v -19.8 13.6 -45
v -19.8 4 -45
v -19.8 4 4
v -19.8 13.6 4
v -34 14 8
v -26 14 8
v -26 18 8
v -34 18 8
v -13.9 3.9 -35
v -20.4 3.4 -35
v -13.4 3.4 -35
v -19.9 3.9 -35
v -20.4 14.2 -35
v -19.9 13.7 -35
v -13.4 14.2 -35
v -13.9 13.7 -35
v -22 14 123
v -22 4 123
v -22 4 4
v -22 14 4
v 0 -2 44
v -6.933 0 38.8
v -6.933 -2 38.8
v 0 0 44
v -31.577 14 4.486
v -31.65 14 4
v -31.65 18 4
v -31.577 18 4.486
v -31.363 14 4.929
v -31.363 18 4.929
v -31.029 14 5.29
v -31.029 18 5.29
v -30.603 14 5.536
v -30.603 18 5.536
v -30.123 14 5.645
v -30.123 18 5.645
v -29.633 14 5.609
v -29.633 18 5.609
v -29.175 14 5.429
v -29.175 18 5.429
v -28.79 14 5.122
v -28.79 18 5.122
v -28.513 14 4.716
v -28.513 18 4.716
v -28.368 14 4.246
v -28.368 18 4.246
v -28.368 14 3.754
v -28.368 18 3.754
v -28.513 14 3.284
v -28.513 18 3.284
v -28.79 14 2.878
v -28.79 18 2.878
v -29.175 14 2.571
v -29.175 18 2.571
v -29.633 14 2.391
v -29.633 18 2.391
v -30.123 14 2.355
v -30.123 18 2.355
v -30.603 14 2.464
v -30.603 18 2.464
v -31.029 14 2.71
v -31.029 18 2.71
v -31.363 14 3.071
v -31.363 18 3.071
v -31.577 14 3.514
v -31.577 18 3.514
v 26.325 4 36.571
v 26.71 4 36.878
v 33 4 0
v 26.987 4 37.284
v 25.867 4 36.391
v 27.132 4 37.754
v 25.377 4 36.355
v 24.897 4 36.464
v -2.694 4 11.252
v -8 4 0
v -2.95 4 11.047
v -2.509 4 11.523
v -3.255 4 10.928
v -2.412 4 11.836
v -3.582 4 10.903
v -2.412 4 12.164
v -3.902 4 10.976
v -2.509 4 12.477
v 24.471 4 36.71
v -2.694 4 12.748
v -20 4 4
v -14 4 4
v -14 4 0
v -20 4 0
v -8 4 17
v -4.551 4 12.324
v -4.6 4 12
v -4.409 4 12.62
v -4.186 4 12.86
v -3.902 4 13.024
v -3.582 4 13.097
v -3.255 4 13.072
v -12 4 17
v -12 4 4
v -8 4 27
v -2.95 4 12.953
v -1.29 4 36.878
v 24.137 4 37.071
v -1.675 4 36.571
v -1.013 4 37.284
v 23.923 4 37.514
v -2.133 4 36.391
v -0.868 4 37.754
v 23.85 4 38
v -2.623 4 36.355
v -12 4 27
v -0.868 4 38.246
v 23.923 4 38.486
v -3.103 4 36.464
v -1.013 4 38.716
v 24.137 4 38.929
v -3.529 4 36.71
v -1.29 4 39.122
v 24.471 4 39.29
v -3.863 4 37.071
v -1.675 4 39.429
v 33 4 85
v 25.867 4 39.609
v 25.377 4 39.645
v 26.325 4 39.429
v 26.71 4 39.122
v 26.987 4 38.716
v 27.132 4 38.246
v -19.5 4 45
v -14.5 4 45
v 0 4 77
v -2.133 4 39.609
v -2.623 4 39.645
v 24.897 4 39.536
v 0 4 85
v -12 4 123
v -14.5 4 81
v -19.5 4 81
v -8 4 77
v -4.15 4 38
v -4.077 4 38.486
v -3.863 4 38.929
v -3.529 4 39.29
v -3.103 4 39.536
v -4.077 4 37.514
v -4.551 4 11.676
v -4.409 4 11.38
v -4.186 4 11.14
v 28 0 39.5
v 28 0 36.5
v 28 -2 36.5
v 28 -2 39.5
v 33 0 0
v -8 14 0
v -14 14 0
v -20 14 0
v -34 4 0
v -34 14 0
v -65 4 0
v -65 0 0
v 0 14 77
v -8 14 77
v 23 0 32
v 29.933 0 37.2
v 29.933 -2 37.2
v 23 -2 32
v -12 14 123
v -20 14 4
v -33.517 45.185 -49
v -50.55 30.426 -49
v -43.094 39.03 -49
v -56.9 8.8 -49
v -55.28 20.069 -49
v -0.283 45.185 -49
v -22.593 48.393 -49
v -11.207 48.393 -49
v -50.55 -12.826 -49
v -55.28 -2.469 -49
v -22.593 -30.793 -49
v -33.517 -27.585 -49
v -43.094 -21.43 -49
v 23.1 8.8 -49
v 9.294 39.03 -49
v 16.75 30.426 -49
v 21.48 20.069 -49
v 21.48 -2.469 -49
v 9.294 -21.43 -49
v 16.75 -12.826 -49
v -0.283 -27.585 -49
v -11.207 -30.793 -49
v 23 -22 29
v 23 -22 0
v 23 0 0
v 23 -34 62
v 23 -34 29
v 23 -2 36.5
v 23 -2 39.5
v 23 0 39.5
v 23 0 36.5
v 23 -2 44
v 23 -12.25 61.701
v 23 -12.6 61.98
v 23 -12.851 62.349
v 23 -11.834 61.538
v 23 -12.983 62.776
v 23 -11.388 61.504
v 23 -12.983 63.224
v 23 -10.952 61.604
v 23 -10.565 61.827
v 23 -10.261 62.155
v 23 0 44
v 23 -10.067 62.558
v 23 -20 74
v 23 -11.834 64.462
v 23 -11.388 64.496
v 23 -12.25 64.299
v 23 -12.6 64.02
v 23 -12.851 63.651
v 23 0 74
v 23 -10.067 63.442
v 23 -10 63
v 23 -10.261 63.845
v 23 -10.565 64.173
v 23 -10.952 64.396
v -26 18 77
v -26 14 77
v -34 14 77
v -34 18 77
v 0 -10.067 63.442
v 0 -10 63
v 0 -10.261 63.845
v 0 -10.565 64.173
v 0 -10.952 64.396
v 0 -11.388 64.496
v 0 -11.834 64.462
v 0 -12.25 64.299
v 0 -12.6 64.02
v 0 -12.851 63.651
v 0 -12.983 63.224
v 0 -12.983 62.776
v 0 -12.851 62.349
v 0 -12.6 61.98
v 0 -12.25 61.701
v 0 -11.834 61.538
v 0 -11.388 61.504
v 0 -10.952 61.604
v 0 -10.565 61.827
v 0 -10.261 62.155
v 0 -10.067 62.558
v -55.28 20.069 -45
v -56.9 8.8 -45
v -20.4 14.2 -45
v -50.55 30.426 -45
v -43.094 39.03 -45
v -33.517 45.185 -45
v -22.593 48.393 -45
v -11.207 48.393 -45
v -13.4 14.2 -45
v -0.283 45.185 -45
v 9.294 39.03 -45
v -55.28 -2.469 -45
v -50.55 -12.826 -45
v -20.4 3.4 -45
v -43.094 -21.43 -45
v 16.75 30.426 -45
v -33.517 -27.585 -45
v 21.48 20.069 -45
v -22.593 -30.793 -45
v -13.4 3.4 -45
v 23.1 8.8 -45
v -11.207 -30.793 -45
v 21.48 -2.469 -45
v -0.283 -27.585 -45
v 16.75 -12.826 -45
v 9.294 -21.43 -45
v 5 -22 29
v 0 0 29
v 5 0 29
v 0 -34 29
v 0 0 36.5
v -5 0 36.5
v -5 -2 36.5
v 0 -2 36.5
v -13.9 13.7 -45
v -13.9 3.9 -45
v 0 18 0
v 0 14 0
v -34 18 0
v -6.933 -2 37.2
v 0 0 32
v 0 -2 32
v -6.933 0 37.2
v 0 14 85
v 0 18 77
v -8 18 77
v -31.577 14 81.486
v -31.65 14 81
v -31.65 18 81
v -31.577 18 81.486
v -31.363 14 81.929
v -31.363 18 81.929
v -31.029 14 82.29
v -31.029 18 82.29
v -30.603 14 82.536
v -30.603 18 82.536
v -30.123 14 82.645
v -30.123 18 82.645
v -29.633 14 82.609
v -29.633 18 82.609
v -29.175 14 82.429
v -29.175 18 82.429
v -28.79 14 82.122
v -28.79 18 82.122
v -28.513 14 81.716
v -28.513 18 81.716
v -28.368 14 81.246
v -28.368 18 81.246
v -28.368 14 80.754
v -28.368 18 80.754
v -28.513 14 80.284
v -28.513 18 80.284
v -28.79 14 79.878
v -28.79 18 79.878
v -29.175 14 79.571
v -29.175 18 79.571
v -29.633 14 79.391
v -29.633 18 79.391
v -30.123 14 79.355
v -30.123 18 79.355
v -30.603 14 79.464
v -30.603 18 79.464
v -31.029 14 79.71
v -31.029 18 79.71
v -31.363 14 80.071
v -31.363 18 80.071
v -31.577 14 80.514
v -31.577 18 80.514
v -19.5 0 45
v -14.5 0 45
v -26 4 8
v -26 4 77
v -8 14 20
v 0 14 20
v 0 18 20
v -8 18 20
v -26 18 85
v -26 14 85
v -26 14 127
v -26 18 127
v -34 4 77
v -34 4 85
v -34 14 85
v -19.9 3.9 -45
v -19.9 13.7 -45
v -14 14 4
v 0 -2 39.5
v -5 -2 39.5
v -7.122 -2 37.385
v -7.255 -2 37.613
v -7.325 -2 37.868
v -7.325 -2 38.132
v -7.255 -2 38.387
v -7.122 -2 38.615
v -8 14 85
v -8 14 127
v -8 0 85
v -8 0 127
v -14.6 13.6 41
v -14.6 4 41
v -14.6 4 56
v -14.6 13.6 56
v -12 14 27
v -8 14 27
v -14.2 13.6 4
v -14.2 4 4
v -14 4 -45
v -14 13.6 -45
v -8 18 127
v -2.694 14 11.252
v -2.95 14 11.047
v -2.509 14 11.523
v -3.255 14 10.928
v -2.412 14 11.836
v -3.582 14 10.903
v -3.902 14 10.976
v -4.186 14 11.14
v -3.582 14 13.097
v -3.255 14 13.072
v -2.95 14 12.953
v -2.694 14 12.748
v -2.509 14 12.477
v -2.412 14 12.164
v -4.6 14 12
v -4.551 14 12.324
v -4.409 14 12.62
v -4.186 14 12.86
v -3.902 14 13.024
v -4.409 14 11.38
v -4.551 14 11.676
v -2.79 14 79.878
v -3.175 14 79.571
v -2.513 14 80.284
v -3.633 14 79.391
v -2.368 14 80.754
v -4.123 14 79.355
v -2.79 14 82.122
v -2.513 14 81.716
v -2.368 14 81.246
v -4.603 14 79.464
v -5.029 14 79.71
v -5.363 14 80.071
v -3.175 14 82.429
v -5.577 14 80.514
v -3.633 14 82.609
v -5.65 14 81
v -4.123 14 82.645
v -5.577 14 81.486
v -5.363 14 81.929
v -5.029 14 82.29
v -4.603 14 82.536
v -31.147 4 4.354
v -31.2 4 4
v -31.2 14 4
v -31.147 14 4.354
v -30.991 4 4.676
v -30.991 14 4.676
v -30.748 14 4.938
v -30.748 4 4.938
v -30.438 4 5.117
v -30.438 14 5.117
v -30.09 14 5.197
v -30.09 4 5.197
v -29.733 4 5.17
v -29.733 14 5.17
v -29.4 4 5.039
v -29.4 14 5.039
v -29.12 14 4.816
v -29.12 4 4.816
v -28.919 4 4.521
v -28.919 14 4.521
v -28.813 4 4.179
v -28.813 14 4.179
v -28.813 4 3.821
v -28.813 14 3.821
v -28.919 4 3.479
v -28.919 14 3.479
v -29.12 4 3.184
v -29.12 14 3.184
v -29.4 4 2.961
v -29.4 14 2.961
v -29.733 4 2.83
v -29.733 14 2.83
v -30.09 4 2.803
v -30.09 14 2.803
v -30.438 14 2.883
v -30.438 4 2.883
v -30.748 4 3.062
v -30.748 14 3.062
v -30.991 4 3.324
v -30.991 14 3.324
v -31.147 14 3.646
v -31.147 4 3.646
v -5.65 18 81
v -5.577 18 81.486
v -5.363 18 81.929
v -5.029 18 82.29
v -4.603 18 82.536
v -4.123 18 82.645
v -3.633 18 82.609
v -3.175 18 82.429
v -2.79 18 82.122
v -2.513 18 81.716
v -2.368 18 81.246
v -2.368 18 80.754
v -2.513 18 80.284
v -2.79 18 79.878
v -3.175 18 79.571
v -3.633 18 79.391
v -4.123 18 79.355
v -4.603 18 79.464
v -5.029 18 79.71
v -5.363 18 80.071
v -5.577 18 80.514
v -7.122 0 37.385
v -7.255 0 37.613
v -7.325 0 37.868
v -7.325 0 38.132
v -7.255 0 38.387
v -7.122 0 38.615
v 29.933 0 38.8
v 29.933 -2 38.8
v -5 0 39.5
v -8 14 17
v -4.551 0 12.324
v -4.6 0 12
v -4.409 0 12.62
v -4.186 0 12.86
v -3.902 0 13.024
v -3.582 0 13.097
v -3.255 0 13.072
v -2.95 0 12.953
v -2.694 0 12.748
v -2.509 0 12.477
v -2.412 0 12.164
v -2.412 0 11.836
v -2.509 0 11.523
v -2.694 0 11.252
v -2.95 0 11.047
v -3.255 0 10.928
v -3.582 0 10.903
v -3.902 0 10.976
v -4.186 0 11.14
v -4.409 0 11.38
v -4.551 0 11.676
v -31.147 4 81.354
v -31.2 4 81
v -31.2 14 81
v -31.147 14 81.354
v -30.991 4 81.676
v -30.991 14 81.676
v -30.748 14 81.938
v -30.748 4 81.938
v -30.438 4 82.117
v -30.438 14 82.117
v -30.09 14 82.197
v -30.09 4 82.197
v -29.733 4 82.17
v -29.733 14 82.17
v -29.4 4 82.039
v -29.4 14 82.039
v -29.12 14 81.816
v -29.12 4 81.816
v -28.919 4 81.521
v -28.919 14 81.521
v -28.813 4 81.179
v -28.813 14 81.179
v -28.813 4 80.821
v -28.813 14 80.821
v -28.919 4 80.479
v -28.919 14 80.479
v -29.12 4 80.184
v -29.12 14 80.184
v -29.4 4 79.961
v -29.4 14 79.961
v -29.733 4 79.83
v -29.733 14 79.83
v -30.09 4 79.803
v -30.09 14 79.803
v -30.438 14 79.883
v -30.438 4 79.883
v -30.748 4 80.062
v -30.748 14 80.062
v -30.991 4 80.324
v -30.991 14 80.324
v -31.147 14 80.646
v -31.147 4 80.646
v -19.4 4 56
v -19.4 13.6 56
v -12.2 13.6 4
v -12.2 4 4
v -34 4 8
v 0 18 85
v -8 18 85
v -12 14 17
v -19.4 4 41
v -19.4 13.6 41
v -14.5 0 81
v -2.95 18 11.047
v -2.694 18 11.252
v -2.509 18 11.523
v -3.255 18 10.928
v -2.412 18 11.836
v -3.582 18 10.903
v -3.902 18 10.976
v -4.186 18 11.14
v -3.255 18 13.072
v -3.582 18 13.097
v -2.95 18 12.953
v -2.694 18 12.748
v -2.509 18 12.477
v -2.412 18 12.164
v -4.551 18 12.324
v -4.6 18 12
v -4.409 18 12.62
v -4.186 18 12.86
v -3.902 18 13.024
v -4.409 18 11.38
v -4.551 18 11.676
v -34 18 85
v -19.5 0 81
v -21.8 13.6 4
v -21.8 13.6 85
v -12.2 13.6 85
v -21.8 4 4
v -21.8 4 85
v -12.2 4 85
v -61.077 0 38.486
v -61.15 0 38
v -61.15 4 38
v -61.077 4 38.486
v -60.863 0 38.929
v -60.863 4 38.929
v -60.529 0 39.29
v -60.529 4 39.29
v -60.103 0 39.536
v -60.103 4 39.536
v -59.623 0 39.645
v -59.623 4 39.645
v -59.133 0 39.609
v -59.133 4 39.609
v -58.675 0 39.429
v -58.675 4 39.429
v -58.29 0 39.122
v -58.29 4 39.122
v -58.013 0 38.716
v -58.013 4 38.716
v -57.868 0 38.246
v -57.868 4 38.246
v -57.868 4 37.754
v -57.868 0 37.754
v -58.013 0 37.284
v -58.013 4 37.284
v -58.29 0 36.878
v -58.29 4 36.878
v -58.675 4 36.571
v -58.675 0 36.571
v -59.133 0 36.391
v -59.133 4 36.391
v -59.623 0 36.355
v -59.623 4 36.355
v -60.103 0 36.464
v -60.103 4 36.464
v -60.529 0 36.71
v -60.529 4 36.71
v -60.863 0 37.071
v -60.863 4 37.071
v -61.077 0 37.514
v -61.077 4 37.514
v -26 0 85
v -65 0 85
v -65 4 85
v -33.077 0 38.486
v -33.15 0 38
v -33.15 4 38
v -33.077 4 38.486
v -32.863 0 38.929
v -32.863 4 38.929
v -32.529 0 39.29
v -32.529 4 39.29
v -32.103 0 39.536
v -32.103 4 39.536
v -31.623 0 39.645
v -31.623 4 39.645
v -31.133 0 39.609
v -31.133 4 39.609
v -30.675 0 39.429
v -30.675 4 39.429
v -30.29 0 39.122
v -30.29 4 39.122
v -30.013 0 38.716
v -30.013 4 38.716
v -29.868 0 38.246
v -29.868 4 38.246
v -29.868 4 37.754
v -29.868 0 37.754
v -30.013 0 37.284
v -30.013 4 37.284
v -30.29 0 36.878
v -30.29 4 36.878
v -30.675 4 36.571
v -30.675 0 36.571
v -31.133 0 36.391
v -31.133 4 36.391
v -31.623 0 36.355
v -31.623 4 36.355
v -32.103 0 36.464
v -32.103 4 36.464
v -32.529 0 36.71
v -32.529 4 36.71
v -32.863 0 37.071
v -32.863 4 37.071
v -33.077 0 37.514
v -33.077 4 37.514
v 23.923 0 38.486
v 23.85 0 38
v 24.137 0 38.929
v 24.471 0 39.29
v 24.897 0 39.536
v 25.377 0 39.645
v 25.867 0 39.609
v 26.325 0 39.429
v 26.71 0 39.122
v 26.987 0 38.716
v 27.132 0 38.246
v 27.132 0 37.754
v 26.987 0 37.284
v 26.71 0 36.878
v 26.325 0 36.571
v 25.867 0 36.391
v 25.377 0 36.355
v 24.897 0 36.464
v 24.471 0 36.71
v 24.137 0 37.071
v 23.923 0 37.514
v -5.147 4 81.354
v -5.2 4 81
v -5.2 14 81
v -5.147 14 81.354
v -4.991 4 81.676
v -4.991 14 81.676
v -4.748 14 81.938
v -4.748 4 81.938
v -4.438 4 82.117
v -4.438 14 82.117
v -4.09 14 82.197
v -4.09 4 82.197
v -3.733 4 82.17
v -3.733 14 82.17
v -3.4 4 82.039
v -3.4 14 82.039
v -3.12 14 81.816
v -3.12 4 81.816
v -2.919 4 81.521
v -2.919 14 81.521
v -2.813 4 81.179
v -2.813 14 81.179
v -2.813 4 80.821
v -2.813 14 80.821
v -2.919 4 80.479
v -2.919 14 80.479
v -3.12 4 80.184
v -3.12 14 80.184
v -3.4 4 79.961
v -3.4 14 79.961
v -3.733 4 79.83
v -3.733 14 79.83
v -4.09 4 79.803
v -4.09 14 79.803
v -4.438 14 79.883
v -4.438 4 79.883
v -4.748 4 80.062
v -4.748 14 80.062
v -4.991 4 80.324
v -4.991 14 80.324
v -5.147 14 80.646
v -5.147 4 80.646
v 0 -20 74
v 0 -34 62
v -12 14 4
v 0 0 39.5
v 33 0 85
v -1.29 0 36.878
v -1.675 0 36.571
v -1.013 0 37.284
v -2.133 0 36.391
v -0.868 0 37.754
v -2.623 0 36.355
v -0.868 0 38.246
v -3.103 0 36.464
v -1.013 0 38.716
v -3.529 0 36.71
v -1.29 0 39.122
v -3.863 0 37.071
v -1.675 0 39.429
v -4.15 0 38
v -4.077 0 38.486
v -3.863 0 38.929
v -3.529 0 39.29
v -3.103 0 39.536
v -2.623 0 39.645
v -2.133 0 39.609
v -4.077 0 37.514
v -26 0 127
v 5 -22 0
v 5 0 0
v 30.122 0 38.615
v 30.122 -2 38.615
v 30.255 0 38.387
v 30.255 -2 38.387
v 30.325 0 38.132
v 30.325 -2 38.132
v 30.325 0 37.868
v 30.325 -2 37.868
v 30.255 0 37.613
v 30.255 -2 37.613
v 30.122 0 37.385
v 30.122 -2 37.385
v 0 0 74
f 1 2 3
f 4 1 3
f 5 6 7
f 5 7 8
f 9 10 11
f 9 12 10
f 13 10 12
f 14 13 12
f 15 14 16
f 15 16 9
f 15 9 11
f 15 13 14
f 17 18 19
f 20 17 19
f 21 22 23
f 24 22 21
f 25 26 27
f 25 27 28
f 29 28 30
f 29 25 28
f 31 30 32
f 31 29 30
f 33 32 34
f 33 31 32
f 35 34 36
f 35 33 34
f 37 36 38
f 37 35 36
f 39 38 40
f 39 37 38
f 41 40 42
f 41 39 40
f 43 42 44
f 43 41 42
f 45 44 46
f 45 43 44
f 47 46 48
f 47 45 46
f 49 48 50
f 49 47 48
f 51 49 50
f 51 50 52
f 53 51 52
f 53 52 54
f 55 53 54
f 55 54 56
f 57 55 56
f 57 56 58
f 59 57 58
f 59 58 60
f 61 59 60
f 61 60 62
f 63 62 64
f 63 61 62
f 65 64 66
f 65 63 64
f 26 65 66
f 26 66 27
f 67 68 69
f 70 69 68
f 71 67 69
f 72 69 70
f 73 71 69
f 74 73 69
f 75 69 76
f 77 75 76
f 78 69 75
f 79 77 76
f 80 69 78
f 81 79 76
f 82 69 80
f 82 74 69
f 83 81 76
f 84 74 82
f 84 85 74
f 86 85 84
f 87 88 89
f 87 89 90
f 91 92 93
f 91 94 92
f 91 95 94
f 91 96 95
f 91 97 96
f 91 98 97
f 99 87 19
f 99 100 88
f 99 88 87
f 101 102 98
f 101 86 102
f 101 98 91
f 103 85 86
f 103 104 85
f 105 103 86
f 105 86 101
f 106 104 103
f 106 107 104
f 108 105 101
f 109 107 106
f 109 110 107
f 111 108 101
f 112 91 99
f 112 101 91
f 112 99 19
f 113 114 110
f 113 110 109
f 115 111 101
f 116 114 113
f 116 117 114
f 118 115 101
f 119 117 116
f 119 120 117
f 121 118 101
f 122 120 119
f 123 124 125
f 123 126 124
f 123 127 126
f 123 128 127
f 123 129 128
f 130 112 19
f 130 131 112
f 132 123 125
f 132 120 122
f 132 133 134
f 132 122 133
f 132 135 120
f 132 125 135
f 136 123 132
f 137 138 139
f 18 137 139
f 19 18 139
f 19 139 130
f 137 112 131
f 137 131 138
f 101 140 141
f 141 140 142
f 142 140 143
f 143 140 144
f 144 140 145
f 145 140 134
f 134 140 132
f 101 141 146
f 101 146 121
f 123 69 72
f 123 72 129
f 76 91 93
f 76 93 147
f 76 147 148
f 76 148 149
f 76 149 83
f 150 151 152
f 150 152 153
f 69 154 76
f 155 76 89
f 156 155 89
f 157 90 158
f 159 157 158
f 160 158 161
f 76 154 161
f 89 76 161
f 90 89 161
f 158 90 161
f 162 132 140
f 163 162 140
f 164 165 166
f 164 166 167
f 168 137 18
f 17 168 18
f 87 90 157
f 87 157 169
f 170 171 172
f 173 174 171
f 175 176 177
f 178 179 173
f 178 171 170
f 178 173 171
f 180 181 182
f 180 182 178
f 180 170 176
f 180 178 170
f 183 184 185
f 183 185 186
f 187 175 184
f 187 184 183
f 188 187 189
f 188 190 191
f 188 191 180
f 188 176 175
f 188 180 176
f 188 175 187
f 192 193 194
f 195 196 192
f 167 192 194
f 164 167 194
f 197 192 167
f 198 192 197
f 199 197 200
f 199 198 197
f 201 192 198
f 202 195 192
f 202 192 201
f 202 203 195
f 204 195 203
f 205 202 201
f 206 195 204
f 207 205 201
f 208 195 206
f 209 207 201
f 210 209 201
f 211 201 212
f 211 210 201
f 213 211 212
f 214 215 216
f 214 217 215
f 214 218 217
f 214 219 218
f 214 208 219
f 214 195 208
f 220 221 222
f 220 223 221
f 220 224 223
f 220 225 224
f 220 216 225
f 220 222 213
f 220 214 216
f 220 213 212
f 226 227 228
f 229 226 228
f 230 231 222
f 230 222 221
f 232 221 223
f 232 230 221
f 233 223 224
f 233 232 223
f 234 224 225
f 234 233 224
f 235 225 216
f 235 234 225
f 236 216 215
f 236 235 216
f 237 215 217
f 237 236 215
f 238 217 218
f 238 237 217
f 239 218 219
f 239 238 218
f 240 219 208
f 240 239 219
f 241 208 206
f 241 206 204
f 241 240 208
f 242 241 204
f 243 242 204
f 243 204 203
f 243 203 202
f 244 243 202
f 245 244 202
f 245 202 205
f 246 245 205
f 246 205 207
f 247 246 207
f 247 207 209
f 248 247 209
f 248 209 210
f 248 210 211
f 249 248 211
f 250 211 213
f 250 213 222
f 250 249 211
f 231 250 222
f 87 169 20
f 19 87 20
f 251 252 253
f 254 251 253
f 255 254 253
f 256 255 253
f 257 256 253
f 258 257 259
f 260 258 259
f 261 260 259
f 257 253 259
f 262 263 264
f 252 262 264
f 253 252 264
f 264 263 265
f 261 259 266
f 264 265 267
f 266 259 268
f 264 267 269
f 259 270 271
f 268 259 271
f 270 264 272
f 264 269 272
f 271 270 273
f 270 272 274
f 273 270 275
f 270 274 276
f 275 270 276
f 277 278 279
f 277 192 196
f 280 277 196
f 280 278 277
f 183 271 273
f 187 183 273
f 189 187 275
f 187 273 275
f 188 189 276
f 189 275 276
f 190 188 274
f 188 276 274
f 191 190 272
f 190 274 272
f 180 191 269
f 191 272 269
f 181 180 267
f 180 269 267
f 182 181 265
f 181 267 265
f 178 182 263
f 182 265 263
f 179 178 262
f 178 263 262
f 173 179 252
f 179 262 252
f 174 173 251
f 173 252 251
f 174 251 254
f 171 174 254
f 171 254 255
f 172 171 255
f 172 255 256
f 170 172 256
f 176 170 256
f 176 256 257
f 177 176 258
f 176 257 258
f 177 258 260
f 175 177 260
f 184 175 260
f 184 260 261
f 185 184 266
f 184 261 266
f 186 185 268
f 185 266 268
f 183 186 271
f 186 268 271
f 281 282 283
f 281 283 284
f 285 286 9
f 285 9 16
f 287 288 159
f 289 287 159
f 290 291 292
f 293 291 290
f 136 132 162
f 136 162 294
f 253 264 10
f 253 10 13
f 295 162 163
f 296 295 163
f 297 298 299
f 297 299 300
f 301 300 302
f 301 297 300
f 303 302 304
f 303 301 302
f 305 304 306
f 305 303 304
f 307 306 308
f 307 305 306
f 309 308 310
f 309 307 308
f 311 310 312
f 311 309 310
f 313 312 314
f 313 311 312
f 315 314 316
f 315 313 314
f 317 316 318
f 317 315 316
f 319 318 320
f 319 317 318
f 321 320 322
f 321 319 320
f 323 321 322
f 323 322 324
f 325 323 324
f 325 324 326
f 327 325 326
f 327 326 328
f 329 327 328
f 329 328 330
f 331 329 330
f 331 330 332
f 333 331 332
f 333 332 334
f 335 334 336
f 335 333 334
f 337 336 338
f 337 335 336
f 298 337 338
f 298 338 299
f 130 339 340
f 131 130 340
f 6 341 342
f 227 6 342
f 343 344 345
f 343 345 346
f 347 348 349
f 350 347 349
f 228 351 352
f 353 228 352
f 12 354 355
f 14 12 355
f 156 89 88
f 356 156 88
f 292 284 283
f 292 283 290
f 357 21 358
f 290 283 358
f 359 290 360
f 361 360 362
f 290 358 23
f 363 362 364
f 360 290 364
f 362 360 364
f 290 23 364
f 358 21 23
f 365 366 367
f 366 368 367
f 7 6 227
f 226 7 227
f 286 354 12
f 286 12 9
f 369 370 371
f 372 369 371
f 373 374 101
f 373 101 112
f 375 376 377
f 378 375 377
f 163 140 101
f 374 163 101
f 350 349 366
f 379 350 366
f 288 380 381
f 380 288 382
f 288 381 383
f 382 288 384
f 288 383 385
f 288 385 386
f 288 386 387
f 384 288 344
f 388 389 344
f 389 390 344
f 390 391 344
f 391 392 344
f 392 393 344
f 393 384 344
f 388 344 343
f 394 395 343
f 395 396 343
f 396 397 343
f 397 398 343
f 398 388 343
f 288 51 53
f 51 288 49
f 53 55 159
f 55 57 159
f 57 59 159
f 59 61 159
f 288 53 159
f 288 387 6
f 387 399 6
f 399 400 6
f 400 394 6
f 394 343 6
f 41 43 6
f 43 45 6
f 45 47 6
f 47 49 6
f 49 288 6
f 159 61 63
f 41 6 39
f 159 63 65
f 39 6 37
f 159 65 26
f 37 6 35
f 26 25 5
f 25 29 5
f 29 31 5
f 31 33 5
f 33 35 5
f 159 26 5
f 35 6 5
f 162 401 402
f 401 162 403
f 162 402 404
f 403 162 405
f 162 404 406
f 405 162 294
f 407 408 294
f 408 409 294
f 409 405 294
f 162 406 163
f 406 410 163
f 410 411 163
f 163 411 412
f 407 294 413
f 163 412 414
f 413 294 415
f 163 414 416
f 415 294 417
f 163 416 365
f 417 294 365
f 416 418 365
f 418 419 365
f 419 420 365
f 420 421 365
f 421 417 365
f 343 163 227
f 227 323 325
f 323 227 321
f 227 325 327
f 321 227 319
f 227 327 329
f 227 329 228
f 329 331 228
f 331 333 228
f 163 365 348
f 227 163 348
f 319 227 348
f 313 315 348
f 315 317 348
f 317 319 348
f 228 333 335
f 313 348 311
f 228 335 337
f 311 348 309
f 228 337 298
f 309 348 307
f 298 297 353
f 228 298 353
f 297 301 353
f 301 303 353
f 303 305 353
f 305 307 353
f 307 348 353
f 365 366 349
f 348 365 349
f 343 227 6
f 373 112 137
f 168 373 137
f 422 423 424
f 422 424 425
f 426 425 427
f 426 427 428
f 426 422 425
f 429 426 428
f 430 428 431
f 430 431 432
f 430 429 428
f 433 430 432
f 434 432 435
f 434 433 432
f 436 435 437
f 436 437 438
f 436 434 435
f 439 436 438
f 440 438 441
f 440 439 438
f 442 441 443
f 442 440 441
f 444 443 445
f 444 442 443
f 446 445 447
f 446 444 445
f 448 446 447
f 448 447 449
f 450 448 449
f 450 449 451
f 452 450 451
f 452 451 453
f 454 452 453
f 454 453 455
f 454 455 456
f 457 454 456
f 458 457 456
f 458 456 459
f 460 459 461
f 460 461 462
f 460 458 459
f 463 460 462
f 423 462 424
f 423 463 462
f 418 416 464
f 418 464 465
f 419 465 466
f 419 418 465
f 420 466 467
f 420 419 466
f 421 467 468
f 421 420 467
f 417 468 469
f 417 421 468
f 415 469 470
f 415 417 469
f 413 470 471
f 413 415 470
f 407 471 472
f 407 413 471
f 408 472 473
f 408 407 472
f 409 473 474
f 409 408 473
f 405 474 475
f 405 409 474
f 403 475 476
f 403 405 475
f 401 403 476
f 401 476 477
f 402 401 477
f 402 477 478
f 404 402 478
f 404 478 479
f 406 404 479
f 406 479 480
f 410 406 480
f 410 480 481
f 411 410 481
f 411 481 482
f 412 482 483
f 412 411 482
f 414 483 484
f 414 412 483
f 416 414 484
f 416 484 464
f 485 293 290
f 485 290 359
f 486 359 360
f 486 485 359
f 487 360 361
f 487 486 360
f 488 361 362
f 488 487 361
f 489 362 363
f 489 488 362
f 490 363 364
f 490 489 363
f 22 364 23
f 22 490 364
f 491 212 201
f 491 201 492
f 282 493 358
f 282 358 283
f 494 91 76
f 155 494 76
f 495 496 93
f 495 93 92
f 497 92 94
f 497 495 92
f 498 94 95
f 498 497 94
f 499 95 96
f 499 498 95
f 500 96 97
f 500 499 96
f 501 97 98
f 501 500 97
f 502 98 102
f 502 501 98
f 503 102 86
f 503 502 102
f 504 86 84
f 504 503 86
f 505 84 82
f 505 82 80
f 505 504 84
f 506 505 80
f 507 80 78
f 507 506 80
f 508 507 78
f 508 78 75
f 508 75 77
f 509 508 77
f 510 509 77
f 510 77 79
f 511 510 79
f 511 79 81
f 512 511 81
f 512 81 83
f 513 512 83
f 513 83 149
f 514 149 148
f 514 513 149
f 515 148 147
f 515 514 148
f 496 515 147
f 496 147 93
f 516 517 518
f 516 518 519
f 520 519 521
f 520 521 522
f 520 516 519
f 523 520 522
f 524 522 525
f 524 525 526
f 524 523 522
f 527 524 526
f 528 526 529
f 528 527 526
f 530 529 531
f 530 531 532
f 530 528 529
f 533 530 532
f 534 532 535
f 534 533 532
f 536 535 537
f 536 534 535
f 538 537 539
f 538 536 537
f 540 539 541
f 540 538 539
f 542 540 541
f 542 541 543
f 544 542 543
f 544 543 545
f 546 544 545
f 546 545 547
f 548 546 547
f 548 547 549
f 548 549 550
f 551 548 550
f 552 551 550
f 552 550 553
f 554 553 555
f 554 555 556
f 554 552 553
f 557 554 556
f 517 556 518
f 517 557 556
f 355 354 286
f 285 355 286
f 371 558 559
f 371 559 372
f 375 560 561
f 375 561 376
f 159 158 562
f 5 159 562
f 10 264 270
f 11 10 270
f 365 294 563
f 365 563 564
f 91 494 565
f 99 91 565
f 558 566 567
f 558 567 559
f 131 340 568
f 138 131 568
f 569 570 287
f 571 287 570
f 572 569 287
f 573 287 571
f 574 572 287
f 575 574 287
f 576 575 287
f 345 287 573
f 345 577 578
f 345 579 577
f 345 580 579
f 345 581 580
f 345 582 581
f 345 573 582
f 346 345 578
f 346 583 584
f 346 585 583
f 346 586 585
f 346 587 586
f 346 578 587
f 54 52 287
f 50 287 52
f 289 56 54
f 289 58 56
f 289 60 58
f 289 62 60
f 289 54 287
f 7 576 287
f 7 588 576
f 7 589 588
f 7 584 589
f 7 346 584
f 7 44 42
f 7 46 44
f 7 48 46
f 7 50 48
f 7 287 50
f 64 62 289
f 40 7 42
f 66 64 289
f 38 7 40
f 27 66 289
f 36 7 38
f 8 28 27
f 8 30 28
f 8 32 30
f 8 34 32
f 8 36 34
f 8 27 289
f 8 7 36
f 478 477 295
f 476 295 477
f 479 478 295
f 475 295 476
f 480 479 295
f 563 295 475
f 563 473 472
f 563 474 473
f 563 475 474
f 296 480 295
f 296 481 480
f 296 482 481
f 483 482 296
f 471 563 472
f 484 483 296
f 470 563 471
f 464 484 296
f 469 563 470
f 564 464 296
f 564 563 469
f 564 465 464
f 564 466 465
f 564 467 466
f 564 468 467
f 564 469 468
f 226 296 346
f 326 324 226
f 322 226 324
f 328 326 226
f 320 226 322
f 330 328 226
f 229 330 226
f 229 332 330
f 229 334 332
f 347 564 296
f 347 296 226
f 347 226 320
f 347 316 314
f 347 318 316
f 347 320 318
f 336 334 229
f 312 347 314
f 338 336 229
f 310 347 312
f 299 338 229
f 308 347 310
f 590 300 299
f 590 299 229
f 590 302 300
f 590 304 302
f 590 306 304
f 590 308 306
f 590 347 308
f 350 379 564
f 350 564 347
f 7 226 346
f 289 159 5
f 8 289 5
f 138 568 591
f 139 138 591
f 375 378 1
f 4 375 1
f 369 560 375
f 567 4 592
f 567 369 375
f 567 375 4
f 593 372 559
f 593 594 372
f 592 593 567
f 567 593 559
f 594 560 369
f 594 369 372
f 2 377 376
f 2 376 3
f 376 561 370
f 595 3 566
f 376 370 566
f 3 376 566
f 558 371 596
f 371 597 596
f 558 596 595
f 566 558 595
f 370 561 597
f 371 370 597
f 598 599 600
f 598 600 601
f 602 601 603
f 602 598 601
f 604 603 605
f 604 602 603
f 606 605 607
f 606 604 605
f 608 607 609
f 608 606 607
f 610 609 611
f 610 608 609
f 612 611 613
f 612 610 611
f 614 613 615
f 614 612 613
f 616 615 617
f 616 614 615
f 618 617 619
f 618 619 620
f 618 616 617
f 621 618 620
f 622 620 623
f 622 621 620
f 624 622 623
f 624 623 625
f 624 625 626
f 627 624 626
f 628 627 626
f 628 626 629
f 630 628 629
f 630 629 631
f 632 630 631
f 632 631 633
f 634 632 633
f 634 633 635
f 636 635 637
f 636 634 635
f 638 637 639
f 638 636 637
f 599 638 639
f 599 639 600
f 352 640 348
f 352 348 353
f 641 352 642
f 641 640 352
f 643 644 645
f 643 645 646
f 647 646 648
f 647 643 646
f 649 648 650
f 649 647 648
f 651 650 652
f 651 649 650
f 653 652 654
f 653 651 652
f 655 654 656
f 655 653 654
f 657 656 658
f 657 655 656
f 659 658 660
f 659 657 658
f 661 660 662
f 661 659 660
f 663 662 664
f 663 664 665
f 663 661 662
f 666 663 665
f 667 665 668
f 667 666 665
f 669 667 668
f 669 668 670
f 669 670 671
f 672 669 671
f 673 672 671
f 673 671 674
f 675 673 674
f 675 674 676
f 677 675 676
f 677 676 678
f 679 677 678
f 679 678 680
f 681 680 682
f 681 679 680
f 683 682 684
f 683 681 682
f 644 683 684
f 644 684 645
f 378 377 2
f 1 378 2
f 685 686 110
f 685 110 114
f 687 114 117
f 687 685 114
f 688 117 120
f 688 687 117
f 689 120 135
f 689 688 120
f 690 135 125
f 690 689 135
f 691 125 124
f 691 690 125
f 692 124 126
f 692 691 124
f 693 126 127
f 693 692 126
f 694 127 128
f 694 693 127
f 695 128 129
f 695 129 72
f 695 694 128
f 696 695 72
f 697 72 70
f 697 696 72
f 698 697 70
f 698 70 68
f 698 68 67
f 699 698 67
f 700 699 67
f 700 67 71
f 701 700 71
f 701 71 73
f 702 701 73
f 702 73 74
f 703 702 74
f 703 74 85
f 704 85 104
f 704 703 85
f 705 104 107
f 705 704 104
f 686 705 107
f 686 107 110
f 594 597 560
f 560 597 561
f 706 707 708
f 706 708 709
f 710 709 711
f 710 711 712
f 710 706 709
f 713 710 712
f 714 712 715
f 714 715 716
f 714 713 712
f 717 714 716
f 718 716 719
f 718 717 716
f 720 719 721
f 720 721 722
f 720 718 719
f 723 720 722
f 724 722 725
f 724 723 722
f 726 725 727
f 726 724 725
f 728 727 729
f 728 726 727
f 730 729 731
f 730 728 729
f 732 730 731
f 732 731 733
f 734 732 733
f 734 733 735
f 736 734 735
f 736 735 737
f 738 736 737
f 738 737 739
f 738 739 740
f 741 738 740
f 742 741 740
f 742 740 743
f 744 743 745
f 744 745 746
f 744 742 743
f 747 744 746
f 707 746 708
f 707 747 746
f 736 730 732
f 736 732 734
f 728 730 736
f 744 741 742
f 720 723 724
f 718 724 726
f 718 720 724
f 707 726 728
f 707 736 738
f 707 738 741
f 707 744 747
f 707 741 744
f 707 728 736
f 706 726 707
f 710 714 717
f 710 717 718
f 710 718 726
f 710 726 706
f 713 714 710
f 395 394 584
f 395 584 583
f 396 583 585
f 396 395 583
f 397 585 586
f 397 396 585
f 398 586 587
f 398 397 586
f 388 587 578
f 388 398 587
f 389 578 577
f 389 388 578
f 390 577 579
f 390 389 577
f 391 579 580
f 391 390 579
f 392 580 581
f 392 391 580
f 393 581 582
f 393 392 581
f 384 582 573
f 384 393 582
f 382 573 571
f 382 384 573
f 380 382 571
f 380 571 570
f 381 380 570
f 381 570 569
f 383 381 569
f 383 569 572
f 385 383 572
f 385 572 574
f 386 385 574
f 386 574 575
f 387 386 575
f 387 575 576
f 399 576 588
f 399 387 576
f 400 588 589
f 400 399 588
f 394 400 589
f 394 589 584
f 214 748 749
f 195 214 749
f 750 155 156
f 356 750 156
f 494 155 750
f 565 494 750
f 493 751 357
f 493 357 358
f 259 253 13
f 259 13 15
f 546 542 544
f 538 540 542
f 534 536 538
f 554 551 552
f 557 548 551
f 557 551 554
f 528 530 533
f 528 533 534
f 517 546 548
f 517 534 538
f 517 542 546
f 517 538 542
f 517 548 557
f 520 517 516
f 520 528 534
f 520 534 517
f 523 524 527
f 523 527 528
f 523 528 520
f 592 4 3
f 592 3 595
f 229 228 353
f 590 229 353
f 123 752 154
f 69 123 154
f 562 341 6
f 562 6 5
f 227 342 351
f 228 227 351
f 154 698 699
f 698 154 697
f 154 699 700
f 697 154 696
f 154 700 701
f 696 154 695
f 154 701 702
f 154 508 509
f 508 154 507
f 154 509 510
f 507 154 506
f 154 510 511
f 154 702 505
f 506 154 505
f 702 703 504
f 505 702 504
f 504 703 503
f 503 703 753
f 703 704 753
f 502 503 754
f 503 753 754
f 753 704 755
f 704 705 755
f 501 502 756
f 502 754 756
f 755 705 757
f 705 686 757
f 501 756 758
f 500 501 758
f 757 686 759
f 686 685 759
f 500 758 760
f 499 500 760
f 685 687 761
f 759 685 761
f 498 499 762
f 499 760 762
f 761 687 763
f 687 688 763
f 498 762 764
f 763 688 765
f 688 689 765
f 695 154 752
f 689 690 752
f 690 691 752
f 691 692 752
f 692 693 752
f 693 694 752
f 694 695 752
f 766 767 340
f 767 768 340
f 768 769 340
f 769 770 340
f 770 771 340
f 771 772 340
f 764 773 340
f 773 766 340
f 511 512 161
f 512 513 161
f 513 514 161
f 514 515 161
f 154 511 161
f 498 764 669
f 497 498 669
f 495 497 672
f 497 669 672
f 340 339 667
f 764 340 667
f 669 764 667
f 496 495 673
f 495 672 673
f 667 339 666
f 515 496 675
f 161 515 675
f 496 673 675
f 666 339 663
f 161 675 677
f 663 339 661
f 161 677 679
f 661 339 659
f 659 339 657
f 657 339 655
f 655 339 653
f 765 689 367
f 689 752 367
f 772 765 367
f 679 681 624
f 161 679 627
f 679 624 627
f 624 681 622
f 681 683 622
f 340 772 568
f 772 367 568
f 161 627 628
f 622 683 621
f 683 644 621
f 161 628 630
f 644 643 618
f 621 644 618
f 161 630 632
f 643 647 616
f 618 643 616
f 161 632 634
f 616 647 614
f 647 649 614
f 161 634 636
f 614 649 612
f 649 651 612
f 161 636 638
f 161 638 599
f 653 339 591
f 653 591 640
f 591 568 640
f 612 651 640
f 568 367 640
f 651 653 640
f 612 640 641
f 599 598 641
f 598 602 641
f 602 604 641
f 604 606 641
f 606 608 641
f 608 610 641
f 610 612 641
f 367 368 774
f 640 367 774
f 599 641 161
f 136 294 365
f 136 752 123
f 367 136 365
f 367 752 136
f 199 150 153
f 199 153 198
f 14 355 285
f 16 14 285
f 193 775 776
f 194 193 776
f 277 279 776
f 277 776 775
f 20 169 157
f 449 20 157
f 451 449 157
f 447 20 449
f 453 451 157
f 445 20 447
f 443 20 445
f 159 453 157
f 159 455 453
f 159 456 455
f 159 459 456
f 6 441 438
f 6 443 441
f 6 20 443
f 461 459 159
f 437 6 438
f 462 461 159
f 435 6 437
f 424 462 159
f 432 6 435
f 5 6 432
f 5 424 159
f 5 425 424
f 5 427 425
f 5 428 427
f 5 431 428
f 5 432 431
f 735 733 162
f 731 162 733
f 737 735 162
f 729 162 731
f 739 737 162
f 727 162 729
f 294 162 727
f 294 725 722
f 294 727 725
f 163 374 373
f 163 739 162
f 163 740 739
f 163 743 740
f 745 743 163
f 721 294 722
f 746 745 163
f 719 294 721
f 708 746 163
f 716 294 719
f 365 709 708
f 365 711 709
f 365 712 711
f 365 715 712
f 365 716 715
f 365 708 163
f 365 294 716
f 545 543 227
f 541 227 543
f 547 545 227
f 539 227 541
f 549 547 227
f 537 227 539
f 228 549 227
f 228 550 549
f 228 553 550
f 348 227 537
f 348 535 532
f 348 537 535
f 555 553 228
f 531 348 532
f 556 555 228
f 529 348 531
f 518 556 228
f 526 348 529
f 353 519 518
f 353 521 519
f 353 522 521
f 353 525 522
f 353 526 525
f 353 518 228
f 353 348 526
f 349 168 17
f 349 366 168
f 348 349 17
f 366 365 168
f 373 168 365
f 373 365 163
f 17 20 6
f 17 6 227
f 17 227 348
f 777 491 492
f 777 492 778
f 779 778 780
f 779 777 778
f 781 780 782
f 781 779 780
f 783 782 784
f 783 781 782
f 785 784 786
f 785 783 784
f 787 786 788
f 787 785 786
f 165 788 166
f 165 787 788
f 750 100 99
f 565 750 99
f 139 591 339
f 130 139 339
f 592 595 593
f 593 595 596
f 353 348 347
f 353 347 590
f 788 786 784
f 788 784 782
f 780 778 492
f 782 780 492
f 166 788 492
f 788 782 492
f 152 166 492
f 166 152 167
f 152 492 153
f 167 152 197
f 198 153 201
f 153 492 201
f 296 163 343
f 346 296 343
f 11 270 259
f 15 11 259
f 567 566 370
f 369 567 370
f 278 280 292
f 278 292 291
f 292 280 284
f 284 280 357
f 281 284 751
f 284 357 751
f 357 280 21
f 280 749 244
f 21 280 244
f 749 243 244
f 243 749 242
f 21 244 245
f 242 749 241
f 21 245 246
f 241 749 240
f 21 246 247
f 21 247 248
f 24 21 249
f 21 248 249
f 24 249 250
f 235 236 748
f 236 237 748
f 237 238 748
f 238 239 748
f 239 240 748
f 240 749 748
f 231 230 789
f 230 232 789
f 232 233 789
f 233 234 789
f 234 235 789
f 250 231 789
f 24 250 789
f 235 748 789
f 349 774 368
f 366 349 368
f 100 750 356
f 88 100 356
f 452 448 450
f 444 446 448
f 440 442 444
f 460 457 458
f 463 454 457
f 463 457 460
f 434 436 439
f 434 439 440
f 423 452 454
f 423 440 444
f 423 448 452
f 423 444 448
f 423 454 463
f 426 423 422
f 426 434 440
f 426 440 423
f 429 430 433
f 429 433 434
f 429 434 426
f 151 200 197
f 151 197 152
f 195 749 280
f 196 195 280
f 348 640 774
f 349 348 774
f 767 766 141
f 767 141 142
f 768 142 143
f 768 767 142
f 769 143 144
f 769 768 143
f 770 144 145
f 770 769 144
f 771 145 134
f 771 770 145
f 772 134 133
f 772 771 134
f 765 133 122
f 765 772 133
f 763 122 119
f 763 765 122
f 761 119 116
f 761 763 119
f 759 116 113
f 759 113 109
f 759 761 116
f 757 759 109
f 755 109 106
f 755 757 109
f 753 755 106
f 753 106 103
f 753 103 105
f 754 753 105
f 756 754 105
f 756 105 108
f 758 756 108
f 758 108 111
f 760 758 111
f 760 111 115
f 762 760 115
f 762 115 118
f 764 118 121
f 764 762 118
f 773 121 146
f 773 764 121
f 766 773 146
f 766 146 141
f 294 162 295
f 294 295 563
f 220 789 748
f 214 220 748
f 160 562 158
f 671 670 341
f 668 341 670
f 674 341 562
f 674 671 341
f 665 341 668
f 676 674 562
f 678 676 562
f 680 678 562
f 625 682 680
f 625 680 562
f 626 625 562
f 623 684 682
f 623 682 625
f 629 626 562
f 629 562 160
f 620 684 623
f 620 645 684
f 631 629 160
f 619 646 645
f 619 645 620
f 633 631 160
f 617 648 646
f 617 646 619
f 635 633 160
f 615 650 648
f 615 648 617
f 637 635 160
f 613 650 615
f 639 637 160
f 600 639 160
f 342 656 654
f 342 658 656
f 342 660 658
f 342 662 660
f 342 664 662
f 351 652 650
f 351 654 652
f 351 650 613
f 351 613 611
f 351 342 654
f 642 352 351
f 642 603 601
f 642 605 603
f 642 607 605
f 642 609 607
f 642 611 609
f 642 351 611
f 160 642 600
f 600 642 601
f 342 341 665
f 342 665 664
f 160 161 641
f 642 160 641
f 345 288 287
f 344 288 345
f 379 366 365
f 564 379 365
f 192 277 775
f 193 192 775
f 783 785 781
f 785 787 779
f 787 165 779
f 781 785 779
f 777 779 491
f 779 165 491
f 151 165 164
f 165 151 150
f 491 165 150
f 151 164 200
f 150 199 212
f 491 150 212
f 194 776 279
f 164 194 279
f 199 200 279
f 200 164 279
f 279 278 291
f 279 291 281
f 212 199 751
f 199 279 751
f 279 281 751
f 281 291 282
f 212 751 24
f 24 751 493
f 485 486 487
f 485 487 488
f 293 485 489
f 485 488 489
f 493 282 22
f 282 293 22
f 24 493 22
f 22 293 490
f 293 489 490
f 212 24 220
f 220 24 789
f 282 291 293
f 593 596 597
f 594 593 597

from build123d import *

# Parameters (mm, degrees)
F0_R      = 1.5
F1_DEPTH  = 23
F2_W      = 22
F2_H      = 29
F3_DEPTH  = 5
F5_DEPTH  = 2
F6_R      = 1.1
F6_R_2    = 1.65
F7_DEPTH  = 4
F8_W      = 8
F8_H      = 8
F8_R      = 1.2
F8_W_2    = 2
F8_H_2    = 4
F9_DEPTH  = 10
F10_W     = 8
F10_H     = 8
F10_R     = 1.65
F10_H_2   = 20
F10_R_2   = 1.1
F11_DEPTH = 4
F13_DEPTH = 9.6
F14_W     = 4.8
F14_H     = 15
F15_DEPTH = 25
F16_R     = 40
F17_DEPTH = 4
F18_W     = 7
F18_H     = 10.8
F18_W_2   = 6
F18_H_2   = 9.8
F19_DEPTH = 10
F20_W     = 4
F20_H     = 10
F21_DEPTH = 10


# Not quite as in the source:
# - a feature names something its author has since deleted; it is built from what else it names


with BuildPart() as f1:
    # F0 (on Right) → F1 (new body)
    with BuildSketch(Plane.YZ):
        Polygon((-22, 0), (0, 0), (0, 74), (-20, 74), (-34, 62), (-34, 29), (-22, 29), align=None)
        with Locations((-11.5, 63)):
            Circle(F0_R, mode=Mode.SUBTRACT)
    extrude(amount=F1_DEPTH)

    # F2 (on face) → F3 (cut)
    with BuildSketch(Plane(origin=(0, 0, 0), x_dir=(0, -1, 0), z_dir=(-1, 0, 0))):
        with Locations((11, 14.5)):
            Rectangle(F2_W, F2_H)
    extrude(amount=-F3_DEPTH, mode=Mode.SUBTRACT)

    # F4 (on face) → F5 (join)
    with BuildSketch(Plane(origin=(0, 0, 0), x_dir=(-1, 0, 0), z_dir=(0, 1, 0))):
        with BuildLine():
            Line((6.9333333333, 38.8), (0, 44))
            Line((0, 44), (0, 39.5))
            Line((0, 39.5), (5, 39.5))
            Line((5, 39.5), (5, 36.5))
            Line((5, 36.5), (0, 36.5))
            Line((0, 36.5), (0, 32))
            Line((0, 32), (6.9333333333, 37.2))
            ThreePointArc((6.9333333333, 37.2), (7.3333333333, 38), (6.9333333333, 38.8))
        make_face()
        with BuildLine():
            Line((-23, 39.5), (-23, 44))
            Line((-23, 44), (-29.9333333333, 38.8))
            ThreePointArc((-29.9333333333, 38.8), (-30.3333333333, 38), (-29.9333333333, 37.2))
            Line((-29.9333333333, 37.2), (-23, 32))
            Line((-23, 32), (-23, 36.5))
            Line((-23, 36.5), (-28, 36.5))
            Line((-28, 36.5), (-28, 39.5))
            Line((-28, 39.5), (-23, 39.5))
        make_face()
    extrude(amount=-F5_DEPTH)


with BuildPart() as f7:
    # F6 (on face) → F7 (new body)
    with BuildSketch(Plane(origin=(0, 0, 0), x_dir=(-1, 0, 0), z_dir=(0, 1, 0))):
        Polygon((-33, 79), (-33, 0), (65, 0), (65, 85), (26, 85), (8, 85), (-33, 85), align=None)
        with Locations((3.5, 12)):
            Circle(F6_R, mode=Mode.SUBTRACT)
        with Locations((-25.5, 38)):
            Circle(F6_R_2, mode=Mode.SUBTRACT)
        with Locations((2.5, 38)):
            Circle(F6_R_2, mode=Mode.SUBTRACT)
        with Locations((31.5, 38)):
            Circle(F6_R_2, mode=Mode.SUBTRACT)
        Polygon((14.5, 81), (17, 81), (19.5, 81), (19.5, 45), (17, 45), (14.5, 45), align=None, mode=Mode.SUBTRACT)
        with Locations((59.5, 38)):
            Circle(F6_R_2, mode=Mode.SUBTRACT)
        Polygon((8, 85), (26, 85), (26, 127), (17, 127), (8, 127), align=None)
    extrude(amount=F7_DEPTH)

    # F8 (on face) → F9 (join)
    with BuildSketch(Plane(origin=(0, 4, 0), x_dir=(-1, 0, 0), z_dir=(0, 1, 0))):
        Polygon((26, 127), (8, 127), (8, 85), (8, 77), (8, 0), (12, 0), (12, 4), (12, 123), (22, 123), (22, 4), (22, 0), (26, 0), (26, 8), (26, 77), (26, 85), align=None)
        with Locations((30, 81)):
            Rectangle(F8_W, F8_H)
        with Locations((30, 81)):
            Circle(F8_R, mode=Mode.SUBTRACT)
        with Locations((4, 81)):
            Rectangle(F8_W, F8_H)
        with Locations((4, 81)):
            Circle(F8_R, mode=Mode.SUBTRACT)
        with Locations((30, 4)):
            Rectangle(F8_W, F8_H)
        with Locations((30, 4)):
            Circle(F8_R, mode=Mode.SUBTRACT)
        with Locations((13, 2)):
            Rectangle(F8_W_2, F8_H_2)
        with Locations((21, 2)):
            Rectangle(F8_W_2, F8_H_2)
    extrude(amount=F9_DEPTH)

    # F20 (on face) → F21 (cut)
    with BuildSketch(Plane(origin=(0, 14, 0), x_dir=(-1, 0, 0), z_dir=(0, 1, 0))):
        with Locations((10, 22)):
            Rectangle(F20_W, F20_H)
    extrude(amount=-F21_DEPTH, mode=Mode.SUBTRACT)


with BuildPart() as f11:
    # F10 (on face) → F11 (new body)
    with BuildSketch(Plane(origin=(0, 14, 0), x_dir=(-1, 0, 0), z_dir=(0, 1, 0))):
        Polygon((14, 4), (14, 0), (20, 0), (20, 4), (22, 4), (22, 123), (12, 123), (12, 4), align=None)
        with Locations((30, 4)):
            Rectangle(F10_W, F10_H)
        with Locations((30, 4)):
            Circle(F10_R, mode=Mode.SUBTRACT)
        with Locations((30, 81)):
            Rectangle(F10_W, F10_H)
        with Locations((30, 81)):
            Circle(F10_R, mode=Mode.SUBTRACT)
        with Locations((4, 81)):
            Rectangle(F10_W, F10_H)
        with Locations((4, 81)):
            Circle(F10_R, mode=Mode.SUBTRACT)
        Polygon((8, 20), (8, 0), (14, 0), (14, 4), (12, 4), (12, 123), (22, 123), (22, 4), (20, 4), (20, 0), (26, 0), (26, 8), (26, 77), (26, 85), (26, 127), (8, 127), (8, 85), (8, 77), align=None)
        with Locations((4, 10)):
            Rectangle(F10_W, F10_H_2)
        with Locations((3.5, 12)):
            Circle(F10_R_2, mode=Mode.SUBTRACT)
    extrude(amount=F11_DEPTH)


with BuildPart() as f13:
    # F12 (on face) → F13 (new body)
    with BuildSketch(Plane(origin=(0, 4, 0), x_dir=(-1, 0, 0), z_dir=(0, 1, 0))):
        Polygon((19.8, 4), (17, 4), (14.2, 4), (14, -45), (19.8, -45), align=None)
        Polygon((14.2, 4), (17, 4), (19.8, 4), (21.8, 4), (21.8, 85), (12.2, 85), (12.2, 4), align=None)
    extrude(amount=F13_DEPTH)

    # F14 (on face) → F15 (cut)
    with BuildSketch(Plane.XZ.offset(-4)):
        with Locations((-17, 48.5)):
            Rectangle(F14_W, F14_H)
    extrude(amount=-F15_DEPTH, mode=Mode.SUBTRACT)


with BuildPart() as f17:
    # F16 (on face) → F17 (new body)
    with BuildSketch(Plane(origin=(0, 0, -45), x_dir=(1, 0, 0), z_dir=(0, 0, -1))):
        with Locations((-16.9, -8.8)):
            Circle(F16_R)
    extrude(amount=F17_DEPTH)

    # F18 (on face) → F19 (join)
    with BuildSketch(Plane.XY.offset(-45)):
        with Locations((-16.9, 8.8)):
            Rectangle(F18_W, F18_H)
        with Locations((-16.9, 8.8)):
            Rectangle(F18_W_2, F18_H_2, mode=Mode.SUBTRACT)
    extrude(amount=F19_DEPTH)


solid = Compound([f1.part, f7.part, f11.part, f13.part, f17.part])
